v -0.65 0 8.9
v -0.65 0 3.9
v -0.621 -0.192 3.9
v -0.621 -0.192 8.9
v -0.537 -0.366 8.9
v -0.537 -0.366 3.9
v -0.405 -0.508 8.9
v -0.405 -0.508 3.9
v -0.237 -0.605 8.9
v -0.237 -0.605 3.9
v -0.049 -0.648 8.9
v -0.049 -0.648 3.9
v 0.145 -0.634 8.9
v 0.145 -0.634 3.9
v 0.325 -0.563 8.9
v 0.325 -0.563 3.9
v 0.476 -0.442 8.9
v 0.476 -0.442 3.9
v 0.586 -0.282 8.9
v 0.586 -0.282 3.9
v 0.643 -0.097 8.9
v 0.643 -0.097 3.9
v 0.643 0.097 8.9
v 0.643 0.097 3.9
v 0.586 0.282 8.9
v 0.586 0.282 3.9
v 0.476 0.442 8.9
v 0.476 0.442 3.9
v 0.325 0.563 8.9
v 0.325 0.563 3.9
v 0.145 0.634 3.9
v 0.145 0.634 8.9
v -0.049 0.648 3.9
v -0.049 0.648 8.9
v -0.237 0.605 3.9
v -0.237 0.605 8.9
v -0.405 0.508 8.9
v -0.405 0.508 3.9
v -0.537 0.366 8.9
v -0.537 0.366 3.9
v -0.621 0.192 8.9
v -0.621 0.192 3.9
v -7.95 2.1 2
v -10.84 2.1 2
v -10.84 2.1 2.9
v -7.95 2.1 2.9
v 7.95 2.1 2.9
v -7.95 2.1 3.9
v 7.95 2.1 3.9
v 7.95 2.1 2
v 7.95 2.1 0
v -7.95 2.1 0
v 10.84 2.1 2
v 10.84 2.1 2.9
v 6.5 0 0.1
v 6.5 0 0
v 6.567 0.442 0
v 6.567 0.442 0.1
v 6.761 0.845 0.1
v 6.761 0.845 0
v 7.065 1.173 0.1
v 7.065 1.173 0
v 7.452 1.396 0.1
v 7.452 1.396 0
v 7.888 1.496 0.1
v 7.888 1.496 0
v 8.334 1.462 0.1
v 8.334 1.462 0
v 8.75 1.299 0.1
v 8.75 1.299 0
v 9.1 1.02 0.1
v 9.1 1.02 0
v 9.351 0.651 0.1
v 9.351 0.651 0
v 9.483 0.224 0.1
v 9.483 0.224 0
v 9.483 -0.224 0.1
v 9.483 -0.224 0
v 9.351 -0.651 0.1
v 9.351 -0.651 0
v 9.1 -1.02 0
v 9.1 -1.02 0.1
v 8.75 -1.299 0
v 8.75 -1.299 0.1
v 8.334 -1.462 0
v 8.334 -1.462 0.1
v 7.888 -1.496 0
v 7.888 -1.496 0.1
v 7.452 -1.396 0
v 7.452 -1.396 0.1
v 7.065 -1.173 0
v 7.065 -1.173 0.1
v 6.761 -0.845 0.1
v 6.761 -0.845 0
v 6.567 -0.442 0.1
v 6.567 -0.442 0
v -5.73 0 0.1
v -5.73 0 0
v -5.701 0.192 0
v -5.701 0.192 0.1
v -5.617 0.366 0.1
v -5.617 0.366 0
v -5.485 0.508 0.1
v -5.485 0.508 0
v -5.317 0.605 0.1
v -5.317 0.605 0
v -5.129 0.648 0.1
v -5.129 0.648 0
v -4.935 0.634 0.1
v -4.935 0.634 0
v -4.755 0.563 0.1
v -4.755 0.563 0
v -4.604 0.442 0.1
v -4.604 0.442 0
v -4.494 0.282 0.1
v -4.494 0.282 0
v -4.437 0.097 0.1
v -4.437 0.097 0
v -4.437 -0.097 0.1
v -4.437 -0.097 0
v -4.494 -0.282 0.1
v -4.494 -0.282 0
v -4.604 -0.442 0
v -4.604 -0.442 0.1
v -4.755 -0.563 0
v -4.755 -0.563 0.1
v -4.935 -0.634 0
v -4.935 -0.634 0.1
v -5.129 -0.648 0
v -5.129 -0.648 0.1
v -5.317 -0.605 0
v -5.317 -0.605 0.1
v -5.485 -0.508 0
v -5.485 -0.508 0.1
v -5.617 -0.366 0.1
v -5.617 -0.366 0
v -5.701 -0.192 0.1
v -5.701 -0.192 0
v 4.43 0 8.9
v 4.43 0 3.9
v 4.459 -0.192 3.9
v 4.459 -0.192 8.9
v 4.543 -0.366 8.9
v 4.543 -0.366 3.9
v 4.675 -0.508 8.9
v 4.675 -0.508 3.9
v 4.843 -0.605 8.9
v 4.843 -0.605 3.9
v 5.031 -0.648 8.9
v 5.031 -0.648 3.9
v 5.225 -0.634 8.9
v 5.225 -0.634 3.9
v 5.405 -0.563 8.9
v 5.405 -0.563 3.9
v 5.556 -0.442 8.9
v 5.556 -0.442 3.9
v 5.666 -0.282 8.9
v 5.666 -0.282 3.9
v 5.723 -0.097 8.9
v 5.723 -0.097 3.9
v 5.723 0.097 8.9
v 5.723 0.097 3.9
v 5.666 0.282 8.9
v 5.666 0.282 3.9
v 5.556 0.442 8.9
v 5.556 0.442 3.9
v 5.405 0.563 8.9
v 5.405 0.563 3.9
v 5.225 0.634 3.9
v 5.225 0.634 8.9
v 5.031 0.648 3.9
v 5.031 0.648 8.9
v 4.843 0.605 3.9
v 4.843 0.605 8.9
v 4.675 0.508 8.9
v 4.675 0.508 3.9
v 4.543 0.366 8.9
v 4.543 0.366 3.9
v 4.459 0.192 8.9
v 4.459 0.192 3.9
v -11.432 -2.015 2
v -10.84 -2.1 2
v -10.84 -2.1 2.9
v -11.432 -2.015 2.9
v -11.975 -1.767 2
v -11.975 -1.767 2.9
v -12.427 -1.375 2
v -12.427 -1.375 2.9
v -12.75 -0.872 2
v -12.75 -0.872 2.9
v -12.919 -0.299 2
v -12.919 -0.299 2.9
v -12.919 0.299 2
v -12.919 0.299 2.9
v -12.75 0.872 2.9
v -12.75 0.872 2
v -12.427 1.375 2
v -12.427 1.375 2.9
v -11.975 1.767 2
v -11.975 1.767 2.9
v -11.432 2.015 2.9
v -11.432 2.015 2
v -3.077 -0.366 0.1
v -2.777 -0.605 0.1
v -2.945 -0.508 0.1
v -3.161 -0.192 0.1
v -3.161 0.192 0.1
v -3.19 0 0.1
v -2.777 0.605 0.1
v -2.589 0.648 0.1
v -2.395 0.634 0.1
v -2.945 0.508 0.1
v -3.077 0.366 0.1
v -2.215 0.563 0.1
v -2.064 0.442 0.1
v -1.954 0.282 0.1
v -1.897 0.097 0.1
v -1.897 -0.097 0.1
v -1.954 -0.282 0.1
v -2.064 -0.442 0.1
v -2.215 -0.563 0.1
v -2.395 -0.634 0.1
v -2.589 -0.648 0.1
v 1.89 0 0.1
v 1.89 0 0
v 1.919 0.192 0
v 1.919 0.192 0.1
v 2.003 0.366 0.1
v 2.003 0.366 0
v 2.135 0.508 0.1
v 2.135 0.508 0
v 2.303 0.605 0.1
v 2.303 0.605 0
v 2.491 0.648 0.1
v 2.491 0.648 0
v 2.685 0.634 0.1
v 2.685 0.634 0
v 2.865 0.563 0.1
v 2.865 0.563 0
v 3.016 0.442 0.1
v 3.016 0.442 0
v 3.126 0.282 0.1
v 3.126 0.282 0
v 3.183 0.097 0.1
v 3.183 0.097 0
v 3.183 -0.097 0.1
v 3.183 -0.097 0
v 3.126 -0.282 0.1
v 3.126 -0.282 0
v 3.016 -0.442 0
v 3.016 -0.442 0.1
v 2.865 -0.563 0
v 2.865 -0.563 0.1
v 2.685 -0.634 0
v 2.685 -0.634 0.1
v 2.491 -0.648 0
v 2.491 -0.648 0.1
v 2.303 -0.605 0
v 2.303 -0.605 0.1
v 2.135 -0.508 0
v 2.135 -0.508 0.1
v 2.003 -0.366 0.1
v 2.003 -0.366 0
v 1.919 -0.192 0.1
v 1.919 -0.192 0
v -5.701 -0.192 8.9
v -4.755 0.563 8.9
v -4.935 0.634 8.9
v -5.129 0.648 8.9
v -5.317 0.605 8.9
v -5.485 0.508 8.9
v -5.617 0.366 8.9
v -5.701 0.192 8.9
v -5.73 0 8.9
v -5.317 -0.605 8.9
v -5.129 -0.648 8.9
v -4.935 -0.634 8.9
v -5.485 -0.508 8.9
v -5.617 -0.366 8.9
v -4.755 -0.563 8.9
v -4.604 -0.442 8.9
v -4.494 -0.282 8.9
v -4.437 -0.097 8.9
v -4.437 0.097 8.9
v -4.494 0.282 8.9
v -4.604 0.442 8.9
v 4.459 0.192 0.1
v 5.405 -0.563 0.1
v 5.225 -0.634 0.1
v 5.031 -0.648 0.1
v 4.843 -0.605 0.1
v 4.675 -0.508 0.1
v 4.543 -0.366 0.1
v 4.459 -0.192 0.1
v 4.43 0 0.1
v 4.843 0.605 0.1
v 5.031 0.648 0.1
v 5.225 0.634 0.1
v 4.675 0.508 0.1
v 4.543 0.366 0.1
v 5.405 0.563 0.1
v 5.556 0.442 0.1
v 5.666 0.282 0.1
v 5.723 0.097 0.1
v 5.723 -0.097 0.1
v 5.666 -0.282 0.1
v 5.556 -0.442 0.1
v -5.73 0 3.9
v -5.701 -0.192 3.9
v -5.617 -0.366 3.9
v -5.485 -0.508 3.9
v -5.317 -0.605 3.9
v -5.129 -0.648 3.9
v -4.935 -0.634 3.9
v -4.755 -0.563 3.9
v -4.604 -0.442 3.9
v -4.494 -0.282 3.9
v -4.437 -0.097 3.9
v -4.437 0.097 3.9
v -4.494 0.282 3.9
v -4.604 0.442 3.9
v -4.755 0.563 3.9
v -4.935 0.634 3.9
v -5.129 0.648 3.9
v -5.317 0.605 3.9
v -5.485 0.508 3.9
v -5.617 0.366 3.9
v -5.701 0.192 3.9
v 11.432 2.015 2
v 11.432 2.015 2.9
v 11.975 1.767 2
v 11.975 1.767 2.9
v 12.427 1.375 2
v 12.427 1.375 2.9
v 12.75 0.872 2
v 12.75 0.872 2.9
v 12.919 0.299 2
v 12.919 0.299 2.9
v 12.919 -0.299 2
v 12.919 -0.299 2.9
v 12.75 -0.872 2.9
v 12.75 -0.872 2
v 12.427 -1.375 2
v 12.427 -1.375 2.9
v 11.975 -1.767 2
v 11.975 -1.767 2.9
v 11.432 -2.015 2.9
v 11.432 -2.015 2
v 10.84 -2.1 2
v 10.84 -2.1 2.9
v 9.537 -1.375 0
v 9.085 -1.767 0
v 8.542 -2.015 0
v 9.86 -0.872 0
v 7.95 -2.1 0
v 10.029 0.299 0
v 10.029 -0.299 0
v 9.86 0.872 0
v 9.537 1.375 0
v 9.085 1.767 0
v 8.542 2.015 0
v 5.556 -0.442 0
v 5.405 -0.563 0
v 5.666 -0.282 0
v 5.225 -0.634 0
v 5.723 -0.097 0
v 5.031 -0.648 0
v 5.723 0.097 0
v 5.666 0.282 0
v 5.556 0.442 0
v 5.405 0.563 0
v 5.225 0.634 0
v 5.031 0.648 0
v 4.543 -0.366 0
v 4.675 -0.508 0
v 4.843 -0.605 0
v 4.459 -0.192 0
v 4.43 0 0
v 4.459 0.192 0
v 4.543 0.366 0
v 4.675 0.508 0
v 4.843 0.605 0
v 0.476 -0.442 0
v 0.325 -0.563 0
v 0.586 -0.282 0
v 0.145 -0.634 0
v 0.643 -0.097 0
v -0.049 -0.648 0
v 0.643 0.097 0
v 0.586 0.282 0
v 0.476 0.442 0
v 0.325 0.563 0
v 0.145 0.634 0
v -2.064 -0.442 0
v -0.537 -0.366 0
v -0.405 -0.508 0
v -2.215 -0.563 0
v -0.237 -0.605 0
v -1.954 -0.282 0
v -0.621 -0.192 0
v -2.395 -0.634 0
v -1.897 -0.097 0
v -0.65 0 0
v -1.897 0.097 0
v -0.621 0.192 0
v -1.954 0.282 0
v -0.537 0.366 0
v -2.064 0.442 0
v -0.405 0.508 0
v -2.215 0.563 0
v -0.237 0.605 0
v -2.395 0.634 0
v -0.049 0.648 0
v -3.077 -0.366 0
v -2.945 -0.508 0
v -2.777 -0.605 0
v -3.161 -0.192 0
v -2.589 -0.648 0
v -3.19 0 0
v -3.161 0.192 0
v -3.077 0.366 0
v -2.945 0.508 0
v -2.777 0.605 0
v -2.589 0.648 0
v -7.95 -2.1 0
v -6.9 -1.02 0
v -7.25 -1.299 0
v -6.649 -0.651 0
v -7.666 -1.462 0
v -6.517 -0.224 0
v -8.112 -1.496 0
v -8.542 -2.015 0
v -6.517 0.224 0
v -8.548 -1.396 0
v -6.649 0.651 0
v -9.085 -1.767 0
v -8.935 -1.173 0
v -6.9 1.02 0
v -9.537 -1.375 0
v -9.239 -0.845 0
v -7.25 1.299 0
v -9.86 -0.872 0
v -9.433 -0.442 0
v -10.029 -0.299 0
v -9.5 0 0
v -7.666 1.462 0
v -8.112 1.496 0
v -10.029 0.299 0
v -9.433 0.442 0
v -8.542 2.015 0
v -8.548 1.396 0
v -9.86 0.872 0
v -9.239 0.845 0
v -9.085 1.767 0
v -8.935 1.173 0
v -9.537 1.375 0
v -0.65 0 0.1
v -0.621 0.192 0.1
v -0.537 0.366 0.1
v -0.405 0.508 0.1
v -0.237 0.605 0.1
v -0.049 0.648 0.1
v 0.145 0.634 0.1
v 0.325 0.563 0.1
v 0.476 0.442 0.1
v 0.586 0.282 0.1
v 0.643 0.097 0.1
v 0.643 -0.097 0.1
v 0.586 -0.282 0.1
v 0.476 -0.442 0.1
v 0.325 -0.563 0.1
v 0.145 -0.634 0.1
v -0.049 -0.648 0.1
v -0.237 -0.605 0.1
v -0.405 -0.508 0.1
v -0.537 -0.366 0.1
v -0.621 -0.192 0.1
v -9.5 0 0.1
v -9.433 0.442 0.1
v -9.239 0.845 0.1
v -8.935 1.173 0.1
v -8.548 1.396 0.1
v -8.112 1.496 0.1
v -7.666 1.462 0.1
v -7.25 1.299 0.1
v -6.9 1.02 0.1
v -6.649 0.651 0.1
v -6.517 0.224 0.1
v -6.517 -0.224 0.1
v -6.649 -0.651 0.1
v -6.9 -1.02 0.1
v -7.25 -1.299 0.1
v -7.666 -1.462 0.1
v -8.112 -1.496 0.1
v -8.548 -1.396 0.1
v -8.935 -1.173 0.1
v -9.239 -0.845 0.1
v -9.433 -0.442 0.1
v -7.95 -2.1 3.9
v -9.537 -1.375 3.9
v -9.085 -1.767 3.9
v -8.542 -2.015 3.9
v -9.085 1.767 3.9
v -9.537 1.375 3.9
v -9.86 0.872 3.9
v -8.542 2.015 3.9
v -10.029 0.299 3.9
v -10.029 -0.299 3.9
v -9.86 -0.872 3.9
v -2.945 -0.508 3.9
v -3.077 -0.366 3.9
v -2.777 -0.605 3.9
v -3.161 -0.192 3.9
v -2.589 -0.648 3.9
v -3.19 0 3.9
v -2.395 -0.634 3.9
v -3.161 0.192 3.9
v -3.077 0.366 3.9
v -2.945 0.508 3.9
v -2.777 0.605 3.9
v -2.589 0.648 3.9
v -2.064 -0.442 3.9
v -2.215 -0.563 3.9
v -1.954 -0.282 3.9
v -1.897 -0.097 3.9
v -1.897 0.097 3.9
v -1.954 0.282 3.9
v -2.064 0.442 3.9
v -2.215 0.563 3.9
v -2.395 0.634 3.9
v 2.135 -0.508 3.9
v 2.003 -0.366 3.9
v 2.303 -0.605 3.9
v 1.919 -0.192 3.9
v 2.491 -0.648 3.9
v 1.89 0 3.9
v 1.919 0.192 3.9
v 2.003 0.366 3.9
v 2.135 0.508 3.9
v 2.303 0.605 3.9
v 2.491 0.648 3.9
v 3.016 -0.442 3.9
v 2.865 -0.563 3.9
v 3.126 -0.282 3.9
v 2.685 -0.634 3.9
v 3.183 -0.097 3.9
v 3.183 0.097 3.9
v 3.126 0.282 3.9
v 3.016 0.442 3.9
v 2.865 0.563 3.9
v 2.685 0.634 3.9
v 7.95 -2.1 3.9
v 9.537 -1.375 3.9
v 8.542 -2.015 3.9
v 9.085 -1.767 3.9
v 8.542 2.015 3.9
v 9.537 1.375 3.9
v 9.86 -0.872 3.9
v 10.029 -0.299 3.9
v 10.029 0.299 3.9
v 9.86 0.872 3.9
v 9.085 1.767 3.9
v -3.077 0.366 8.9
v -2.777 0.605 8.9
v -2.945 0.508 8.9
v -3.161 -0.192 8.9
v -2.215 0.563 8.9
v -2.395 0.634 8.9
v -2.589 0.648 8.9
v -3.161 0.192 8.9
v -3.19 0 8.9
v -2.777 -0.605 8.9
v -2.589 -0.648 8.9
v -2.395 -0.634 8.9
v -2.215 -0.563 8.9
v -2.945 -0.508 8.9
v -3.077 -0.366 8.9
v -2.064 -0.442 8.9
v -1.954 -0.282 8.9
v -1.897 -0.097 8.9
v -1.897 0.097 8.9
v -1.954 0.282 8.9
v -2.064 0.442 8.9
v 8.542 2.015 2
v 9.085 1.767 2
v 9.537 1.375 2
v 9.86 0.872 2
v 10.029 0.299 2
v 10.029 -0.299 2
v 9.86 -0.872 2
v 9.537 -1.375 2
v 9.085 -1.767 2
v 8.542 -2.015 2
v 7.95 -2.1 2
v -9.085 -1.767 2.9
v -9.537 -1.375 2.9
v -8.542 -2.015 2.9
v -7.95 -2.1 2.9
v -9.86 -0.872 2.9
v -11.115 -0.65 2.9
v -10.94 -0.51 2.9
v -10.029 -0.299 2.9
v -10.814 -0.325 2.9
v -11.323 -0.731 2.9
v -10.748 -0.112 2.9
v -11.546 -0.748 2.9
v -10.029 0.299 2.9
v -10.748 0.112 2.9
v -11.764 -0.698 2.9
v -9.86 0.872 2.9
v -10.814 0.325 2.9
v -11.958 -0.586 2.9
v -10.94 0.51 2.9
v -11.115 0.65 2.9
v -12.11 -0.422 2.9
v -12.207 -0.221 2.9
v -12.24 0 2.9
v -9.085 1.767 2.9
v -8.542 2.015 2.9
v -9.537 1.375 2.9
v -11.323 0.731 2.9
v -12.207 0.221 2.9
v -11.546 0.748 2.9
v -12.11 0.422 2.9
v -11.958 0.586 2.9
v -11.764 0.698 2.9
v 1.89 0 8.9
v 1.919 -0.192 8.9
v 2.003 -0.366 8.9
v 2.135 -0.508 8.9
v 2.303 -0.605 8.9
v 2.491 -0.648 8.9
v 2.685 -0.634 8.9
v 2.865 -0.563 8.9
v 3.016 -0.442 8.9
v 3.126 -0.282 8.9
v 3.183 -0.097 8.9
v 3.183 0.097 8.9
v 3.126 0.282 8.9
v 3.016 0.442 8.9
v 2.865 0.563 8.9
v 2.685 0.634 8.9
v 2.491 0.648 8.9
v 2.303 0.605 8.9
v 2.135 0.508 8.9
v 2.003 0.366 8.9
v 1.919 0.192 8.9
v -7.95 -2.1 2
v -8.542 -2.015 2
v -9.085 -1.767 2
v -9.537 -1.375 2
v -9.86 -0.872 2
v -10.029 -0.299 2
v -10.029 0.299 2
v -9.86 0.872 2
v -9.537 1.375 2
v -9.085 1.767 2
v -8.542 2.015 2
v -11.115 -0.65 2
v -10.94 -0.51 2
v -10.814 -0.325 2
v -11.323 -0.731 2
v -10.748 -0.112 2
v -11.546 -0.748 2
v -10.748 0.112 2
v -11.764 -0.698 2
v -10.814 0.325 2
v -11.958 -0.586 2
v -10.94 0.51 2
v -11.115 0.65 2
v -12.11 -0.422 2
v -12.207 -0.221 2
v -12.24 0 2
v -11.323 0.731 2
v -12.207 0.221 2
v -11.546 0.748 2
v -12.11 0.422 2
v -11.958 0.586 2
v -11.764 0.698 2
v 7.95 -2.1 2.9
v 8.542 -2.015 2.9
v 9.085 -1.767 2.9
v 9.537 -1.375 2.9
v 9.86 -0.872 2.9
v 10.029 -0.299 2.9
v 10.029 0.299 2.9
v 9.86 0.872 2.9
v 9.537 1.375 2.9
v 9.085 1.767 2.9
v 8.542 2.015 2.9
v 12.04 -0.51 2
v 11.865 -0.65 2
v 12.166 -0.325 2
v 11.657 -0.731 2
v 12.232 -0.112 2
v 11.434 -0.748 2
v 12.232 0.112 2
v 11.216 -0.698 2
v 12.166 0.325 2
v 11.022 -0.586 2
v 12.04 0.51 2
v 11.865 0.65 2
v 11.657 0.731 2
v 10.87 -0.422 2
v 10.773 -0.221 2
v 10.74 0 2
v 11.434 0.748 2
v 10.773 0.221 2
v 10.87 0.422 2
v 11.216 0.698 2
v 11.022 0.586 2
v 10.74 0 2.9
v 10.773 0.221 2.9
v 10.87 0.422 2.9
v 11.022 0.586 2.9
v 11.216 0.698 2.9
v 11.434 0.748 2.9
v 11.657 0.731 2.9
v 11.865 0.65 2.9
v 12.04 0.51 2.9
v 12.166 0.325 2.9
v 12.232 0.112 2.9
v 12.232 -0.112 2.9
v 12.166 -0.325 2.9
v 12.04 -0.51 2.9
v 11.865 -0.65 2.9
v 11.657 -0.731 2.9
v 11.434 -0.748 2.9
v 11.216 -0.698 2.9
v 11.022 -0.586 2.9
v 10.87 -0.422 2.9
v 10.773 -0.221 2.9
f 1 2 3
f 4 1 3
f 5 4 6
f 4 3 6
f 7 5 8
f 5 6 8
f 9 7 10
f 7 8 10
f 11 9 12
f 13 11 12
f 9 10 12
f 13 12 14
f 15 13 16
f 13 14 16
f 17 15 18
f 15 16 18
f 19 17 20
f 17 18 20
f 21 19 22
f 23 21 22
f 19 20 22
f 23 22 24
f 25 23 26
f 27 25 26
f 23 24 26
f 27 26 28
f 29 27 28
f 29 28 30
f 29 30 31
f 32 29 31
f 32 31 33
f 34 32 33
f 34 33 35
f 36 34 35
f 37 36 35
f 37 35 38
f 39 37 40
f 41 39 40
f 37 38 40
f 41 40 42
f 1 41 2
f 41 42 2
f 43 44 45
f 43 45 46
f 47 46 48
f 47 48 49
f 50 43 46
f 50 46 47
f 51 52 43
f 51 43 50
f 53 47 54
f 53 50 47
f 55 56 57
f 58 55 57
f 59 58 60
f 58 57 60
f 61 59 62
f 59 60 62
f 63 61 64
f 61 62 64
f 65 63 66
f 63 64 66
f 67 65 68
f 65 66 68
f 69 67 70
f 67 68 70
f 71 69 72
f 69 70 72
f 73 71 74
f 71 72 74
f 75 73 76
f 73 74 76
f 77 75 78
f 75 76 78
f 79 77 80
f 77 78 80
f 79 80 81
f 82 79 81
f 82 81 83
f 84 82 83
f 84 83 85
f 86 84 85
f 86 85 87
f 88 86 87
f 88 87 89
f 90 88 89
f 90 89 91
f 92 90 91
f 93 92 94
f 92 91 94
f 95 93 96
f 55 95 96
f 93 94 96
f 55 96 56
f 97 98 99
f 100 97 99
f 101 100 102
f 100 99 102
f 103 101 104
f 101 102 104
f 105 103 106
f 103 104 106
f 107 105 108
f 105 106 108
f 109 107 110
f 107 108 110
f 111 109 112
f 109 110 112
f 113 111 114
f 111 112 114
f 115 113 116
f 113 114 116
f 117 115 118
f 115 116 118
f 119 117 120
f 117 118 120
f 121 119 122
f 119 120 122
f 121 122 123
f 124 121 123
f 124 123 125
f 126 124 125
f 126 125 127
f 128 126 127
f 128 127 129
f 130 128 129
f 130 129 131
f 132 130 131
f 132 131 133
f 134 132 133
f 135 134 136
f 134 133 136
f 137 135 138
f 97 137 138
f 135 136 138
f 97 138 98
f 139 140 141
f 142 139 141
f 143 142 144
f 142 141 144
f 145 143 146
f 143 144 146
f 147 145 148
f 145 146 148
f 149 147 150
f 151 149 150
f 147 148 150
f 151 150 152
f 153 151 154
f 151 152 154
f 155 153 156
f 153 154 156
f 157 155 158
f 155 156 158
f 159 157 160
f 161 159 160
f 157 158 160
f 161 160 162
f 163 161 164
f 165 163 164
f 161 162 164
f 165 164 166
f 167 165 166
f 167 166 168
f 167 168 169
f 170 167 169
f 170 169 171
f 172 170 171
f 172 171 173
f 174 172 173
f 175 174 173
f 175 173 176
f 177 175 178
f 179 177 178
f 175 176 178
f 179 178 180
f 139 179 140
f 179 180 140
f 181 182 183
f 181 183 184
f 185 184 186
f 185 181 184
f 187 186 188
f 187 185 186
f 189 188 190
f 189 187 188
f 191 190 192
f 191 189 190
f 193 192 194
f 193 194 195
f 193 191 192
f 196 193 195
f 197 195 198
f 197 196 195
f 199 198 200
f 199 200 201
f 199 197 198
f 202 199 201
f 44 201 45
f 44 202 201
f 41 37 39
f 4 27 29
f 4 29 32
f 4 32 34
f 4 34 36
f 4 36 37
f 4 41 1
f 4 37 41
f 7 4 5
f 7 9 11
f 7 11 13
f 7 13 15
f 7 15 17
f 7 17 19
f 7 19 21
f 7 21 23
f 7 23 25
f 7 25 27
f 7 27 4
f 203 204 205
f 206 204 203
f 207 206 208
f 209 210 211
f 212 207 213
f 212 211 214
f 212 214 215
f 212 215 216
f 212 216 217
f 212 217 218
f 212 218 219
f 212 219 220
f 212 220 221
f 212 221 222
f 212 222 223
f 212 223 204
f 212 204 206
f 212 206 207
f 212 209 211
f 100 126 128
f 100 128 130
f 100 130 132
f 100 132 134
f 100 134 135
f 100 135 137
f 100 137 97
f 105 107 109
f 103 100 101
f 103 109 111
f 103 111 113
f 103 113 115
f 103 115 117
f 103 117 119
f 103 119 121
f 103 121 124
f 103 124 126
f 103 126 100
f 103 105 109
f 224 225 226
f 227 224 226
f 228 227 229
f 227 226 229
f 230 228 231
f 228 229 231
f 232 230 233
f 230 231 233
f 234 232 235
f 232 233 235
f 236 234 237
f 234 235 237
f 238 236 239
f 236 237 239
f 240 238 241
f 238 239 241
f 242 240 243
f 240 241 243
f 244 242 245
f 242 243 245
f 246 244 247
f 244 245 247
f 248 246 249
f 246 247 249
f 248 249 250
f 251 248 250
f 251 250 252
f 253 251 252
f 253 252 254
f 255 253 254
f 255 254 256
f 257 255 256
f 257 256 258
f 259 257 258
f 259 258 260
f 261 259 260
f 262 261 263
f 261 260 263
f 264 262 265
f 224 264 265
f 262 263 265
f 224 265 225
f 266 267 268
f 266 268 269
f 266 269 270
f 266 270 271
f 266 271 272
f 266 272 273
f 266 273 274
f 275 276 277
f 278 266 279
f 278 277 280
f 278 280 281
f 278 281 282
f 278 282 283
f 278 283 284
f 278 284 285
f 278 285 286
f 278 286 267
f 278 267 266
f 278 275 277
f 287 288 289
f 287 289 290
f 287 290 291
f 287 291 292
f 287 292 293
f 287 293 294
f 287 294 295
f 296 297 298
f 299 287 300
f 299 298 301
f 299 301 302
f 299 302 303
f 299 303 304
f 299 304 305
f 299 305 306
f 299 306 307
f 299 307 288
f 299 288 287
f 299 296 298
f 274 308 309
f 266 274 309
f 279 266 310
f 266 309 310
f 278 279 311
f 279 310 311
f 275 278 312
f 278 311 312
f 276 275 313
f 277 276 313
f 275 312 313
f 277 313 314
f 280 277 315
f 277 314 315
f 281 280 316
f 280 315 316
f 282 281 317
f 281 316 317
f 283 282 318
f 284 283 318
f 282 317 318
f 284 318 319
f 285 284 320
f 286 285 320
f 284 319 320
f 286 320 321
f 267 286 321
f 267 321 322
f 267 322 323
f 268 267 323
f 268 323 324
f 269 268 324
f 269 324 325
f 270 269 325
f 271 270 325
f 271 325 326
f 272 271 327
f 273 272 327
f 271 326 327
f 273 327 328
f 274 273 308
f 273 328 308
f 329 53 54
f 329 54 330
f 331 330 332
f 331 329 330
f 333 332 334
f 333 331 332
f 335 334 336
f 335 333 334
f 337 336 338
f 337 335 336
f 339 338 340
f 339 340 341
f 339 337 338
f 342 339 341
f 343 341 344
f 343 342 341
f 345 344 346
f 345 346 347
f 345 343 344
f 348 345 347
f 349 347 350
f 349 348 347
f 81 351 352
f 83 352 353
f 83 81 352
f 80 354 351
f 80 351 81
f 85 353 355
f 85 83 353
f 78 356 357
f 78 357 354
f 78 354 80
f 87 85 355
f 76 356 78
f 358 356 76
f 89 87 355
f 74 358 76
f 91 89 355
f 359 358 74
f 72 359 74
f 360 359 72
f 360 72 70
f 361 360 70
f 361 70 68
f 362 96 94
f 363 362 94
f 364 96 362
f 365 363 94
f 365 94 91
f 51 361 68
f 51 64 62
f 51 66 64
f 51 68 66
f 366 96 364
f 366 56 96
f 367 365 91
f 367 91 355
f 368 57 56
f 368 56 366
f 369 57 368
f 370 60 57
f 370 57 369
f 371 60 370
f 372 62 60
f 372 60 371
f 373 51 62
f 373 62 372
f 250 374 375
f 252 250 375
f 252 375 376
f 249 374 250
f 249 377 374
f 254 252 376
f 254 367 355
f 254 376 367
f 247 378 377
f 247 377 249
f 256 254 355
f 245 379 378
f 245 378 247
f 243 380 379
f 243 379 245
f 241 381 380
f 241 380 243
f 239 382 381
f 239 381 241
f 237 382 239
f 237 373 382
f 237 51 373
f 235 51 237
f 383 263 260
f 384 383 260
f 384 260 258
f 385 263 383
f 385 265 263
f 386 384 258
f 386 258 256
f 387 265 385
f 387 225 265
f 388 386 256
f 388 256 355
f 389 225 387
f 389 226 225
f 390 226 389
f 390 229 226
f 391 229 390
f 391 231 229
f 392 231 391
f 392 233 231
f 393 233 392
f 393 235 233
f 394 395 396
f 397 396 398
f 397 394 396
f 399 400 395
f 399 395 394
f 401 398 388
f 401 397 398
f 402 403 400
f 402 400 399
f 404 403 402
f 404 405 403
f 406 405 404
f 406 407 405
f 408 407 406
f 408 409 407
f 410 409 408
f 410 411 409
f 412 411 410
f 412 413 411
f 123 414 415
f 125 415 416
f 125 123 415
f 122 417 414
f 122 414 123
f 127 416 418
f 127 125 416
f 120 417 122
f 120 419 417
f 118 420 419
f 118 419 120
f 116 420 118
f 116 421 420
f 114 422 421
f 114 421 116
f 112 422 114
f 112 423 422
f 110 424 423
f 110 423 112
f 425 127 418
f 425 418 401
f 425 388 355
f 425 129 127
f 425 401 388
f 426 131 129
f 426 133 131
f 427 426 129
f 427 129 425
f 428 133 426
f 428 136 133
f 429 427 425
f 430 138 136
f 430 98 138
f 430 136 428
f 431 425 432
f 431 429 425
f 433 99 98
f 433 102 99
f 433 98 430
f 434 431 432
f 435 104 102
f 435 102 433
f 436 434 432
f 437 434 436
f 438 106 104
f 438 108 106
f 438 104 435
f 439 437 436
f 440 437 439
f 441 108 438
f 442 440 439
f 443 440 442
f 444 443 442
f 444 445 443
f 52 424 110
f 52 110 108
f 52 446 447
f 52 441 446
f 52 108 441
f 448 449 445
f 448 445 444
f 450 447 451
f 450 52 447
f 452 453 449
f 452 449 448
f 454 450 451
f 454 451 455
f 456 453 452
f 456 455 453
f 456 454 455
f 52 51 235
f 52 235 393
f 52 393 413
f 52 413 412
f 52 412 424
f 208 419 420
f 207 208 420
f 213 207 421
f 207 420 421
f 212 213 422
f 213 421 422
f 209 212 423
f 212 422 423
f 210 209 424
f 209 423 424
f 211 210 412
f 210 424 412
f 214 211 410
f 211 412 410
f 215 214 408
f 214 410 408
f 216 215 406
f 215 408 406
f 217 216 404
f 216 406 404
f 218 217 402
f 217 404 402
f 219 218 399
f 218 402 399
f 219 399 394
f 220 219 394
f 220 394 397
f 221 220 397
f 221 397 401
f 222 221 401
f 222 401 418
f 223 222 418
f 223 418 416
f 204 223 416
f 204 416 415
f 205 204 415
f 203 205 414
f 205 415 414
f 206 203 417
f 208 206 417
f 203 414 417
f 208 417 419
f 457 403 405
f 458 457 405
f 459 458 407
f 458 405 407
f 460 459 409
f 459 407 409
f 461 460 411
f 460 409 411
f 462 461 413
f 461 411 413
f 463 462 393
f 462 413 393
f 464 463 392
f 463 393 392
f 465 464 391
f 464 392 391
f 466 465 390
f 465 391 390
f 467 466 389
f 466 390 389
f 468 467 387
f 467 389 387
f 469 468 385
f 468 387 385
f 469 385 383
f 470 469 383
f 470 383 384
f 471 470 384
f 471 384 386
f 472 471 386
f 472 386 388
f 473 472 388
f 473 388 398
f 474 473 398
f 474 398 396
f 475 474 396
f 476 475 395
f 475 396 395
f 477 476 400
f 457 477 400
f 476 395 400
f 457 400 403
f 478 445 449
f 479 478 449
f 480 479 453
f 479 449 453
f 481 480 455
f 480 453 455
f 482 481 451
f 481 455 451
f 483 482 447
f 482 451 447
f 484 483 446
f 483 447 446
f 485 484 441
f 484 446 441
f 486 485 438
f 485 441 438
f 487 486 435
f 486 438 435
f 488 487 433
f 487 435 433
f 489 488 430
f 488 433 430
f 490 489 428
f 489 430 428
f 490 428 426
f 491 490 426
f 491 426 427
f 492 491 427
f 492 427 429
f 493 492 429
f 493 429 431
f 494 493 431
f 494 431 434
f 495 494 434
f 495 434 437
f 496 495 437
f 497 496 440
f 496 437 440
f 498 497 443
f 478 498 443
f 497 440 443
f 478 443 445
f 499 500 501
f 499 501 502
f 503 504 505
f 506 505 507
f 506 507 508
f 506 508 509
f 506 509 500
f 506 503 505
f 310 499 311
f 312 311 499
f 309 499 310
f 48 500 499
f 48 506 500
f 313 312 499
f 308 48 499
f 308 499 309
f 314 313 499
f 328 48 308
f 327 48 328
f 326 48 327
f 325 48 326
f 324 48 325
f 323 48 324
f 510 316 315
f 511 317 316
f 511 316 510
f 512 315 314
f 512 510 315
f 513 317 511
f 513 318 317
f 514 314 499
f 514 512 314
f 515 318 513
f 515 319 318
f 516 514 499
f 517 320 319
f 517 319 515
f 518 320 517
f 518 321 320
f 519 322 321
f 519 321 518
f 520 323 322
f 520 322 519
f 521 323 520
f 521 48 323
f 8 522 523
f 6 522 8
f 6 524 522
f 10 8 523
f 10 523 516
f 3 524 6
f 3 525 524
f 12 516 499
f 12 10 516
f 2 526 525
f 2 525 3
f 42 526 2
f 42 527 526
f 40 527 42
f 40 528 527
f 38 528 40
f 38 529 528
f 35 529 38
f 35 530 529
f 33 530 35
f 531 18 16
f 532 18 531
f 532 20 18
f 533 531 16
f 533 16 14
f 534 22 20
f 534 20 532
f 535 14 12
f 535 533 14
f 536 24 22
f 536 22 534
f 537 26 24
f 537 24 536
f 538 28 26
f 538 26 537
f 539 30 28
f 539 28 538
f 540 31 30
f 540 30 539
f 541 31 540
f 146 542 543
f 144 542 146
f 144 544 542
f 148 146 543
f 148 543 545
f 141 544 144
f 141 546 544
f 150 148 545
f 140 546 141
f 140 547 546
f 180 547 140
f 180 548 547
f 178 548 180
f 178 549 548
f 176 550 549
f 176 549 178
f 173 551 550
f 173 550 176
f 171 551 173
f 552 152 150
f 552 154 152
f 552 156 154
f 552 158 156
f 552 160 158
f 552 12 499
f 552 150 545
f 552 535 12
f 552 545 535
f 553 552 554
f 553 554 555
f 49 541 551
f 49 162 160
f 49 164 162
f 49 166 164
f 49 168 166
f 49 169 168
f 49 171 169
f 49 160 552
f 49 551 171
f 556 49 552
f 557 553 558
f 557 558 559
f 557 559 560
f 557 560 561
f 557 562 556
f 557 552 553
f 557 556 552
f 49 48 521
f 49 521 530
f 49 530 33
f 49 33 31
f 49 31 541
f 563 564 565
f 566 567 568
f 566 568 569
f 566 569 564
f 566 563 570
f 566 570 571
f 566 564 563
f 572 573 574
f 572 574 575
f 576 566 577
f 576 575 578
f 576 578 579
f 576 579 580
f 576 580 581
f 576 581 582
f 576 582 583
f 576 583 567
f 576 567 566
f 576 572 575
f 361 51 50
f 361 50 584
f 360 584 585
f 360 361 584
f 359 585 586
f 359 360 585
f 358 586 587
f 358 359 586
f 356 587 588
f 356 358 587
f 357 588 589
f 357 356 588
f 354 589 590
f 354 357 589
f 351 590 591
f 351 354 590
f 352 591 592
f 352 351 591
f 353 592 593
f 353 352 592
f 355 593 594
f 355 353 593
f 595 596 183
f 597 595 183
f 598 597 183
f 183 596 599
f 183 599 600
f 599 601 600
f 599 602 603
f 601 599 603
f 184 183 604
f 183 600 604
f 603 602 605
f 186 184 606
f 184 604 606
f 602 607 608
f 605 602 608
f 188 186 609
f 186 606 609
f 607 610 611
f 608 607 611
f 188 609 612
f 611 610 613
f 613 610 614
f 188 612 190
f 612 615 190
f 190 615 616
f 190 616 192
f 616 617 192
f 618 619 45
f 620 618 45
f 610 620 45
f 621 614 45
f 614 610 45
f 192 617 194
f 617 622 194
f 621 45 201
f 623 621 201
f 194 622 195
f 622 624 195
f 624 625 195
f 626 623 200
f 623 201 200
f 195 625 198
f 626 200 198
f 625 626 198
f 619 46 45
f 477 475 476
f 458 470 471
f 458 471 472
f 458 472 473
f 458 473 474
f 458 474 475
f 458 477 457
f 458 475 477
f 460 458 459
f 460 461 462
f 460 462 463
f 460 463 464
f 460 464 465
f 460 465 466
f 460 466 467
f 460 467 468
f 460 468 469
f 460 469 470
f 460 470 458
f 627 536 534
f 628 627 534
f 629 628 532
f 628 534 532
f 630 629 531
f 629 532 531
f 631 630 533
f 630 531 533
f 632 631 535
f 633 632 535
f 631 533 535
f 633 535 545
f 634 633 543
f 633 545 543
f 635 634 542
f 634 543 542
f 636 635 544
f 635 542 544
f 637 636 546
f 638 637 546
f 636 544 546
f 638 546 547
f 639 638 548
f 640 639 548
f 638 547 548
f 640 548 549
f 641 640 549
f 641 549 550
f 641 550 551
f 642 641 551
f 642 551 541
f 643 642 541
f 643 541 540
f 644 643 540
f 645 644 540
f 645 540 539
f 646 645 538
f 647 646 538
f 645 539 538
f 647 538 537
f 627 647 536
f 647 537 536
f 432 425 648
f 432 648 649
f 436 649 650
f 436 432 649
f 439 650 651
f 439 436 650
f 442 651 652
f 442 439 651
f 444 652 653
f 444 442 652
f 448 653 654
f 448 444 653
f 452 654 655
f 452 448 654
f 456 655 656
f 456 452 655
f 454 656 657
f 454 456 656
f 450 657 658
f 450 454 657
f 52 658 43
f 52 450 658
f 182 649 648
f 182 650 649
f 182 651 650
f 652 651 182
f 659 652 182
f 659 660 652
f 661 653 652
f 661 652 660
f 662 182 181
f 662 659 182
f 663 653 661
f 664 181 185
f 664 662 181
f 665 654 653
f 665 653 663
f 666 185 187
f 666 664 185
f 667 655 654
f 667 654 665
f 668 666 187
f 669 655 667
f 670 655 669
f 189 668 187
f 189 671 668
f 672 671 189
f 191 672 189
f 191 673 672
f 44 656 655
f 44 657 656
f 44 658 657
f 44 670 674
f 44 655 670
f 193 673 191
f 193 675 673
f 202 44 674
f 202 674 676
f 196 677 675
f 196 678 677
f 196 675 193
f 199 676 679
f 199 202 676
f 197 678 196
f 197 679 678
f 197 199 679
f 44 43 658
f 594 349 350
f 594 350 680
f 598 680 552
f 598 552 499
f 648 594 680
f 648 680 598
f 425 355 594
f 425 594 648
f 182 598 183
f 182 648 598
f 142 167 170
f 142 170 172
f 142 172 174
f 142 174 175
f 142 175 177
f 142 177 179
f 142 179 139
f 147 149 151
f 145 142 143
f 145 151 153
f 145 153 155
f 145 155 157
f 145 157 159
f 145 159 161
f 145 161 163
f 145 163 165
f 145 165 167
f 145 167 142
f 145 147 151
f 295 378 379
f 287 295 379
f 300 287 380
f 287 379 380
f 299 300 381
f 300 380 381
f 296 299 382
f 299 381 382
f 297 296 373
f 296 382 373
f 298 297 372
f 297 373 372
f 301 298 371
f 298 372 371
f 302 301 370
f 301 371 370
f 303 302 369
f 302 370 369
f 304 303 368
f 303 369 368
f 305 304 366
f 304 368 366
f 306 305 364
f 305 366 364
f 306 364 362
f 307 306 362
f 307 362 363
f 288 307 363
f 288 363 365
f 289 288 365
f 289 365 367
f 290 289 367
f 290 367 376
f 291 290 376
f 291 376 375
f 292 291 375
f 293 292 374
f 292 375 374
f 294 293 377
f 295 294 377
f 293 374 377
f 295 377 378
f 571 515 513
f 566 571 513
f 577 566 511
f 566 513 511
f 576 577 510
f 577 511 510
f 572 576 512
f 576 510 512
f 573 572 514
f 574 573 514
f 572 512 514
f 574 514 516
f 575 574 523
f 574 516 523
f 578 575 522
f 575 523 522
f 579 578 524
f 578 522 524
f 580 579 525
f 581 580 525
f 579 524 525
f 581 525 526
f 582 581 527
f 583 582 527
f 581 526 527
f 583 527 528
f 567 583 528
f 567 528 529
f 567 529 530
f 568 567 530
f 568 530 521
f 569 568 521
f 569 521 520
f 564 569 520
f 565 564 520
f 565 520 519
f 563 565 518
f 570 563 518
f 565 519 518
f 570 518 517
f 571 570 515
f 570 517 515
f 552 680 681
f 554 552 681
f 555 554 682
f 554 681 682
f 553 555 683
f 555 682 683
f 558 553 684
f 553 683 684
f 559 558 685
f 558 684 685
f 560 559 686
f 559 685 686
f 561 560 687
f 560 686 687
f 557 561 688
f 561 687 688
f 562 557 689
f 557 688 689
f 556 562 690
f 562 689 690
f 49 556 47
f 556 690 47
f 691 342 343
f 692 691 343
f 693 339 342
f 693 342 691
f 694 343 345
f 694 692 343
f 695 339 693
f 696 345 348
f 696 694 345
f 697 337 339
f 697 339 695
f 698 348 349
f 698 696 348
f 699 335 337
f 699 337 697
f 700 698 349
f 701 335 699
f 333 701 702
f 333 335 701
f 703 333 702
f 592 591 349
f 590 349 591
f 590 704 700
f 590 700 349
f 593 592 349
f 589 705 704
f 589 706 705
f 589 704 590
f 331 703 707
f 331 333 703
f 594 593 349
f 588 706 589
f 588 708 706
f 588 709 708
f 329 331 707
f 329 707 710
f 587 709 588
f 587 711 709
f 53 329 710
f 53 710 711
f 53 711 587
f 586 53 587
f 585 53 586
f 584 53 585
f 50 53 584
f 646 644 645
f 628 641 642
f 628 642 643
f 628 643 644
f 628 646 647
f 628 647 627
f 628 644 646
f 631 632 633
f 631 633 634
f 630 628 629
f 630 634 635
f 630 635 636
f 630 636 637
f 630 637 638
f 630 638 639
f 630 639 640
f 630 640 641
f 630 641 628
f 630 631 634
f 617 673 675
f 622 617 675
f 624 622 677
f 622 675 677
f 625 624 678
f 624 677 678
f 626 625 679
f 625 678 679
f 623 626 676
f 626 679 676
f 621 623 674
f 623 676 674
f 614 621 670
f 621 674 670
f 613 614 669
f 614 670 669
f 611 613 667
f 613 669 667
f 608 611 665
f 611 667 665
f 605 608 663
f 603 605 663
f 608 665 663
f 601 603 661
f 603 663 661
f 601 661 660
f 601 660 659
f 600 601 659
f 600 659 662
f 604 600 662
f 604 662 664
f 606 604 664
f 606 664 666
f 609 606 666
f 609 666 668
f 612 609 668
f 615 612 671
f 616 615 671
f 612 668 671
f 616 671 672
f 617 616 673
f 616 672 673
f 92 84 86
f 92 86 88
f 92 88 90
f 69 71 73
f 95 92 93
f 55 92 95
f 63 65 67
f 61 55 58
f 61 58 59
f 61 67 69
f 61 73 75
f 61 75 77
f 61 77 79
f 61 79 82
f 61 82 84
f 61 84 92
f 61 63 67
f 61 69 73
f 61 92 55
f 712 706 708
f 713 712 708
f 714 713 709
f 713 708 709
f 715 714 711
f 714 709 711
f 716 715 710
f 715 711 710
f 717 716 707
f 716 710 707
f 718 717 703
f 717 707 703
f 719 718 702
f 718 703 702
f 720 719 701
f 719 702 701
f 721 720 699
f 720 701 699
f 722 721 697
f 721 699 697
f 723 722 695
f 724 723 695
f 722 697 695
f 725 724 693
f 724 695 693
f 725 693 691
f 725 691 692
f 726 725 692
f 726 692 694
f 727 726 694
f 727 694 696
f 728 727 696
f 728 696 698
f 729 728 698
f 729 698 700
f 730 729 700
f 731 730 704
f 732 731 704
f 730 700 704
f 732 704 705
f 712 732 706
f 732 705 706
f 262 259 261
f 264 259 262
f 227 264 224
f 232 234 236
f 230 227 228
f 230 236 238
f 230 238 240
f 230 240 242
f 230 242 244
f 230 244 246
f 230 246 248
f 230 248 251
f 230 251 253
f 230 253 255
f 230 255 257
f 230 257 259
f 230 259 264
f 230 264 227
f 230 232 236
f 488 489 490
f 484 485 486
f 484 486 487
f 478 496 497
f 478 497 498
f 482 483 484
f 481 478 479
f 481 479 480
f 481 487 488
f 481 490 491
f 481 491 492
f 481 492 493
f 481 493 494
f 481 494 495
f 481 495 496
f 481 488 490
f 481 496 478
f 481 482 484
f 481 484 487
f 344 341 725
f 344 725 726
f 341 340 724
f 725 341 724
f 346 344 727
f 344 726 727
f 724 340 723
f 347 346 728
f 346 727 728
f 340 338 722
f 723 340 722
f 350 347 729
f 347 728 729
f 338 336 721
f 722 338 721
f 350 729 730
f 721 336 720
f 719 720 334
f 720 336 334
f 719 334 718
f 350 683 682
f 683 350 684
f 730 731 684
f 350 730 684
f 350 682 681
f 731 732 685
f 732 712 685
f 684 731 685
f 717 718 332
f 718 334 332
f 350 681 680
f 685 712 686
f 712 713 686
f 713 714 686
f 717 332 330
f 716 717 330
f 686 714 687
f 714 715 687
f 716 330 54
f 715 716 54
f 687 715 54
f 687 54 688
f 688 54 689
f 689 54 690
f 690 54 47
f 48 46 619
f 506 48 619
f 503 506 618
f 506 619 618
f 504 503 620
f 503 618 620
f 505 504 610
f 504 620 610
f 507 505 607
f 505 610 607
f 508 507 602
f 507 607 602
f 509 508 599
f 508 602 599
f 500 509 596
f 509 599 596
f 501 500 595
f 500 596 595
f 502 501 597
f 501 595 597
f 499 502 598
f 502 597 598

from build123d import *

# Parameters (mm, degrees)
BOSS_EXTRUDE1_DEPTH = 2
BOSS_EXTRUDE2_DEPTH = 0.9
SKETCH3_R           = 0.75
CUT_EXTRUDE1_DEPTH  = 0.9
SKETCH4_R           = 0.65
SKETCH4_R_2         = 1.5
CUT_EXTRUDE2_DEPTH  = 0.1
BOSS_EXTRUDE3_DEPTH = 1
SKETCH6_R           = 0.65
BOSS_EXTRUDE4_DEPTH = 5


with BuildPart() as part:
    # Sketch1 → Boss-Extrude1 (new body)
    with BuildSketch(Plane.XY):
        with BuildLine():
            Line((-7.95, 2.1), (7.95, 2.1))
            ThreePointArc((7.95, 2.1), (10.05, 0), (7.95, -2.1))
            Line((7.95, -2.1), (-7.95, -2.1))
            ThreePointArc((-7.95, -2.1), (-10.05, 0), (-7.95, 2.1))
        make_face()
    extrude(amount=BOSS_EXTRUDE1_DEPTH)

    # Sketch2 → Boss-Extrude2 (add)
    with BuildSketch(Plane.XY.offset(2)):
        with BuildLine():
            Line((-10.84, 2.1), (10.84, 2.1))
            ThreePointArc((10.84, 2.1), (12.94, 0), (10.84, -2.1))
            Line((10.84, -2.1), (-10.84, -2.1))
            ThreePointArc((-10.84, -2.1), (-12.94, 0), (-10.84, 2.1))
        make_face()
    extrude(amount=BOSS_EXTRUDE2_DEPTH)

    # Sketch3 → Cut-Extrude1 (cut)
    with BuildSketch(Plane(origin=(0, 0, 2), x_dir=(-1, 0, 0), z_dir=(0, 0, -1))):
        with Locations((-11.49, 0)):
            Circle(SKETCH3_R)
        with Locations((11.49, 0)):
            Circle(SKETCH3_R)
    extrude(amount=-CUT_EXTRUDE1_DEPTH, mode=Mode.SUBTRACT)

    # Sketch4 → Cut-Extrude2 (cut)
    with BuildSketch(Plane(origin=(0, 0, 0), x_dir=(-1, 0, 0), z_dir=(0, 0, -1))):
        Circle(SKETCH4_R)
        with Locations((2.54, 0)):
            Circle(SKETCH4_R)
        with Locations((5.08, 0)):
            Circle(SKETCH4_R)
        with Locations((-2.54, 0)):
            Circle(SKETCH4_R)
        with Locations((-5.08, 0)):
            Circle(SKETCH4_R)
        with Locations((-8, 0)):
            Circle(SKETCH4_R_2)
        with Locations((8, 0)):
            Circle(SKETCH4_R_2)
    extrude(amount=-CUT_EXTRUDE2_DEPTH, mode=Mode.SUBTRACT)

    # Sketch5 → Boss-Extrude3 (add)
    with BuildSketch(Plane.XY.offset(2.9)):
        with BuildLine():
            Line((7.95, 2.1), (-7.95, 2.1))
            ThreePointArc((-7.95, 2.1), (-10.05, 0), (-7.95, -2.1))
            Line((-7.95, -2.1), (7.95, -2.1))
            ThreePointArc((7.95, -2.1), (10.05, 0), (7.95, 2.1))
        make_face()
    extrude(amount=BOSS_EXTRUDE3_DEPTH)

    # Sketch6 → Boss-Extrude4 (add)
    with BuildSketch(Plane.XY.offset(3.9)):
        with Locations(Location((-5.08, 0, 0), (0, 0, 180))):
            Circle(SKETCH6_R)
        with Locations(Location((-2.54, 0, 0), (0, 0, 180))):
            Circle(SKETCH6_R)
        with Locations(Location((0, 0, 0), (0, 0, 180))):
            Circle(SKETCH6_R)
        with Locations(Location((2.54, 0, 0), (0, 0, 180))):
            Circle(SKETCH6_R)
        with Locations(Location((5.08, 0, 0), (0, 0, 180))):
            Circle(SKETCH6_R)
    extrude(amount=BOSS_EXTRUDE4_DEPTH)


solid = part.part
